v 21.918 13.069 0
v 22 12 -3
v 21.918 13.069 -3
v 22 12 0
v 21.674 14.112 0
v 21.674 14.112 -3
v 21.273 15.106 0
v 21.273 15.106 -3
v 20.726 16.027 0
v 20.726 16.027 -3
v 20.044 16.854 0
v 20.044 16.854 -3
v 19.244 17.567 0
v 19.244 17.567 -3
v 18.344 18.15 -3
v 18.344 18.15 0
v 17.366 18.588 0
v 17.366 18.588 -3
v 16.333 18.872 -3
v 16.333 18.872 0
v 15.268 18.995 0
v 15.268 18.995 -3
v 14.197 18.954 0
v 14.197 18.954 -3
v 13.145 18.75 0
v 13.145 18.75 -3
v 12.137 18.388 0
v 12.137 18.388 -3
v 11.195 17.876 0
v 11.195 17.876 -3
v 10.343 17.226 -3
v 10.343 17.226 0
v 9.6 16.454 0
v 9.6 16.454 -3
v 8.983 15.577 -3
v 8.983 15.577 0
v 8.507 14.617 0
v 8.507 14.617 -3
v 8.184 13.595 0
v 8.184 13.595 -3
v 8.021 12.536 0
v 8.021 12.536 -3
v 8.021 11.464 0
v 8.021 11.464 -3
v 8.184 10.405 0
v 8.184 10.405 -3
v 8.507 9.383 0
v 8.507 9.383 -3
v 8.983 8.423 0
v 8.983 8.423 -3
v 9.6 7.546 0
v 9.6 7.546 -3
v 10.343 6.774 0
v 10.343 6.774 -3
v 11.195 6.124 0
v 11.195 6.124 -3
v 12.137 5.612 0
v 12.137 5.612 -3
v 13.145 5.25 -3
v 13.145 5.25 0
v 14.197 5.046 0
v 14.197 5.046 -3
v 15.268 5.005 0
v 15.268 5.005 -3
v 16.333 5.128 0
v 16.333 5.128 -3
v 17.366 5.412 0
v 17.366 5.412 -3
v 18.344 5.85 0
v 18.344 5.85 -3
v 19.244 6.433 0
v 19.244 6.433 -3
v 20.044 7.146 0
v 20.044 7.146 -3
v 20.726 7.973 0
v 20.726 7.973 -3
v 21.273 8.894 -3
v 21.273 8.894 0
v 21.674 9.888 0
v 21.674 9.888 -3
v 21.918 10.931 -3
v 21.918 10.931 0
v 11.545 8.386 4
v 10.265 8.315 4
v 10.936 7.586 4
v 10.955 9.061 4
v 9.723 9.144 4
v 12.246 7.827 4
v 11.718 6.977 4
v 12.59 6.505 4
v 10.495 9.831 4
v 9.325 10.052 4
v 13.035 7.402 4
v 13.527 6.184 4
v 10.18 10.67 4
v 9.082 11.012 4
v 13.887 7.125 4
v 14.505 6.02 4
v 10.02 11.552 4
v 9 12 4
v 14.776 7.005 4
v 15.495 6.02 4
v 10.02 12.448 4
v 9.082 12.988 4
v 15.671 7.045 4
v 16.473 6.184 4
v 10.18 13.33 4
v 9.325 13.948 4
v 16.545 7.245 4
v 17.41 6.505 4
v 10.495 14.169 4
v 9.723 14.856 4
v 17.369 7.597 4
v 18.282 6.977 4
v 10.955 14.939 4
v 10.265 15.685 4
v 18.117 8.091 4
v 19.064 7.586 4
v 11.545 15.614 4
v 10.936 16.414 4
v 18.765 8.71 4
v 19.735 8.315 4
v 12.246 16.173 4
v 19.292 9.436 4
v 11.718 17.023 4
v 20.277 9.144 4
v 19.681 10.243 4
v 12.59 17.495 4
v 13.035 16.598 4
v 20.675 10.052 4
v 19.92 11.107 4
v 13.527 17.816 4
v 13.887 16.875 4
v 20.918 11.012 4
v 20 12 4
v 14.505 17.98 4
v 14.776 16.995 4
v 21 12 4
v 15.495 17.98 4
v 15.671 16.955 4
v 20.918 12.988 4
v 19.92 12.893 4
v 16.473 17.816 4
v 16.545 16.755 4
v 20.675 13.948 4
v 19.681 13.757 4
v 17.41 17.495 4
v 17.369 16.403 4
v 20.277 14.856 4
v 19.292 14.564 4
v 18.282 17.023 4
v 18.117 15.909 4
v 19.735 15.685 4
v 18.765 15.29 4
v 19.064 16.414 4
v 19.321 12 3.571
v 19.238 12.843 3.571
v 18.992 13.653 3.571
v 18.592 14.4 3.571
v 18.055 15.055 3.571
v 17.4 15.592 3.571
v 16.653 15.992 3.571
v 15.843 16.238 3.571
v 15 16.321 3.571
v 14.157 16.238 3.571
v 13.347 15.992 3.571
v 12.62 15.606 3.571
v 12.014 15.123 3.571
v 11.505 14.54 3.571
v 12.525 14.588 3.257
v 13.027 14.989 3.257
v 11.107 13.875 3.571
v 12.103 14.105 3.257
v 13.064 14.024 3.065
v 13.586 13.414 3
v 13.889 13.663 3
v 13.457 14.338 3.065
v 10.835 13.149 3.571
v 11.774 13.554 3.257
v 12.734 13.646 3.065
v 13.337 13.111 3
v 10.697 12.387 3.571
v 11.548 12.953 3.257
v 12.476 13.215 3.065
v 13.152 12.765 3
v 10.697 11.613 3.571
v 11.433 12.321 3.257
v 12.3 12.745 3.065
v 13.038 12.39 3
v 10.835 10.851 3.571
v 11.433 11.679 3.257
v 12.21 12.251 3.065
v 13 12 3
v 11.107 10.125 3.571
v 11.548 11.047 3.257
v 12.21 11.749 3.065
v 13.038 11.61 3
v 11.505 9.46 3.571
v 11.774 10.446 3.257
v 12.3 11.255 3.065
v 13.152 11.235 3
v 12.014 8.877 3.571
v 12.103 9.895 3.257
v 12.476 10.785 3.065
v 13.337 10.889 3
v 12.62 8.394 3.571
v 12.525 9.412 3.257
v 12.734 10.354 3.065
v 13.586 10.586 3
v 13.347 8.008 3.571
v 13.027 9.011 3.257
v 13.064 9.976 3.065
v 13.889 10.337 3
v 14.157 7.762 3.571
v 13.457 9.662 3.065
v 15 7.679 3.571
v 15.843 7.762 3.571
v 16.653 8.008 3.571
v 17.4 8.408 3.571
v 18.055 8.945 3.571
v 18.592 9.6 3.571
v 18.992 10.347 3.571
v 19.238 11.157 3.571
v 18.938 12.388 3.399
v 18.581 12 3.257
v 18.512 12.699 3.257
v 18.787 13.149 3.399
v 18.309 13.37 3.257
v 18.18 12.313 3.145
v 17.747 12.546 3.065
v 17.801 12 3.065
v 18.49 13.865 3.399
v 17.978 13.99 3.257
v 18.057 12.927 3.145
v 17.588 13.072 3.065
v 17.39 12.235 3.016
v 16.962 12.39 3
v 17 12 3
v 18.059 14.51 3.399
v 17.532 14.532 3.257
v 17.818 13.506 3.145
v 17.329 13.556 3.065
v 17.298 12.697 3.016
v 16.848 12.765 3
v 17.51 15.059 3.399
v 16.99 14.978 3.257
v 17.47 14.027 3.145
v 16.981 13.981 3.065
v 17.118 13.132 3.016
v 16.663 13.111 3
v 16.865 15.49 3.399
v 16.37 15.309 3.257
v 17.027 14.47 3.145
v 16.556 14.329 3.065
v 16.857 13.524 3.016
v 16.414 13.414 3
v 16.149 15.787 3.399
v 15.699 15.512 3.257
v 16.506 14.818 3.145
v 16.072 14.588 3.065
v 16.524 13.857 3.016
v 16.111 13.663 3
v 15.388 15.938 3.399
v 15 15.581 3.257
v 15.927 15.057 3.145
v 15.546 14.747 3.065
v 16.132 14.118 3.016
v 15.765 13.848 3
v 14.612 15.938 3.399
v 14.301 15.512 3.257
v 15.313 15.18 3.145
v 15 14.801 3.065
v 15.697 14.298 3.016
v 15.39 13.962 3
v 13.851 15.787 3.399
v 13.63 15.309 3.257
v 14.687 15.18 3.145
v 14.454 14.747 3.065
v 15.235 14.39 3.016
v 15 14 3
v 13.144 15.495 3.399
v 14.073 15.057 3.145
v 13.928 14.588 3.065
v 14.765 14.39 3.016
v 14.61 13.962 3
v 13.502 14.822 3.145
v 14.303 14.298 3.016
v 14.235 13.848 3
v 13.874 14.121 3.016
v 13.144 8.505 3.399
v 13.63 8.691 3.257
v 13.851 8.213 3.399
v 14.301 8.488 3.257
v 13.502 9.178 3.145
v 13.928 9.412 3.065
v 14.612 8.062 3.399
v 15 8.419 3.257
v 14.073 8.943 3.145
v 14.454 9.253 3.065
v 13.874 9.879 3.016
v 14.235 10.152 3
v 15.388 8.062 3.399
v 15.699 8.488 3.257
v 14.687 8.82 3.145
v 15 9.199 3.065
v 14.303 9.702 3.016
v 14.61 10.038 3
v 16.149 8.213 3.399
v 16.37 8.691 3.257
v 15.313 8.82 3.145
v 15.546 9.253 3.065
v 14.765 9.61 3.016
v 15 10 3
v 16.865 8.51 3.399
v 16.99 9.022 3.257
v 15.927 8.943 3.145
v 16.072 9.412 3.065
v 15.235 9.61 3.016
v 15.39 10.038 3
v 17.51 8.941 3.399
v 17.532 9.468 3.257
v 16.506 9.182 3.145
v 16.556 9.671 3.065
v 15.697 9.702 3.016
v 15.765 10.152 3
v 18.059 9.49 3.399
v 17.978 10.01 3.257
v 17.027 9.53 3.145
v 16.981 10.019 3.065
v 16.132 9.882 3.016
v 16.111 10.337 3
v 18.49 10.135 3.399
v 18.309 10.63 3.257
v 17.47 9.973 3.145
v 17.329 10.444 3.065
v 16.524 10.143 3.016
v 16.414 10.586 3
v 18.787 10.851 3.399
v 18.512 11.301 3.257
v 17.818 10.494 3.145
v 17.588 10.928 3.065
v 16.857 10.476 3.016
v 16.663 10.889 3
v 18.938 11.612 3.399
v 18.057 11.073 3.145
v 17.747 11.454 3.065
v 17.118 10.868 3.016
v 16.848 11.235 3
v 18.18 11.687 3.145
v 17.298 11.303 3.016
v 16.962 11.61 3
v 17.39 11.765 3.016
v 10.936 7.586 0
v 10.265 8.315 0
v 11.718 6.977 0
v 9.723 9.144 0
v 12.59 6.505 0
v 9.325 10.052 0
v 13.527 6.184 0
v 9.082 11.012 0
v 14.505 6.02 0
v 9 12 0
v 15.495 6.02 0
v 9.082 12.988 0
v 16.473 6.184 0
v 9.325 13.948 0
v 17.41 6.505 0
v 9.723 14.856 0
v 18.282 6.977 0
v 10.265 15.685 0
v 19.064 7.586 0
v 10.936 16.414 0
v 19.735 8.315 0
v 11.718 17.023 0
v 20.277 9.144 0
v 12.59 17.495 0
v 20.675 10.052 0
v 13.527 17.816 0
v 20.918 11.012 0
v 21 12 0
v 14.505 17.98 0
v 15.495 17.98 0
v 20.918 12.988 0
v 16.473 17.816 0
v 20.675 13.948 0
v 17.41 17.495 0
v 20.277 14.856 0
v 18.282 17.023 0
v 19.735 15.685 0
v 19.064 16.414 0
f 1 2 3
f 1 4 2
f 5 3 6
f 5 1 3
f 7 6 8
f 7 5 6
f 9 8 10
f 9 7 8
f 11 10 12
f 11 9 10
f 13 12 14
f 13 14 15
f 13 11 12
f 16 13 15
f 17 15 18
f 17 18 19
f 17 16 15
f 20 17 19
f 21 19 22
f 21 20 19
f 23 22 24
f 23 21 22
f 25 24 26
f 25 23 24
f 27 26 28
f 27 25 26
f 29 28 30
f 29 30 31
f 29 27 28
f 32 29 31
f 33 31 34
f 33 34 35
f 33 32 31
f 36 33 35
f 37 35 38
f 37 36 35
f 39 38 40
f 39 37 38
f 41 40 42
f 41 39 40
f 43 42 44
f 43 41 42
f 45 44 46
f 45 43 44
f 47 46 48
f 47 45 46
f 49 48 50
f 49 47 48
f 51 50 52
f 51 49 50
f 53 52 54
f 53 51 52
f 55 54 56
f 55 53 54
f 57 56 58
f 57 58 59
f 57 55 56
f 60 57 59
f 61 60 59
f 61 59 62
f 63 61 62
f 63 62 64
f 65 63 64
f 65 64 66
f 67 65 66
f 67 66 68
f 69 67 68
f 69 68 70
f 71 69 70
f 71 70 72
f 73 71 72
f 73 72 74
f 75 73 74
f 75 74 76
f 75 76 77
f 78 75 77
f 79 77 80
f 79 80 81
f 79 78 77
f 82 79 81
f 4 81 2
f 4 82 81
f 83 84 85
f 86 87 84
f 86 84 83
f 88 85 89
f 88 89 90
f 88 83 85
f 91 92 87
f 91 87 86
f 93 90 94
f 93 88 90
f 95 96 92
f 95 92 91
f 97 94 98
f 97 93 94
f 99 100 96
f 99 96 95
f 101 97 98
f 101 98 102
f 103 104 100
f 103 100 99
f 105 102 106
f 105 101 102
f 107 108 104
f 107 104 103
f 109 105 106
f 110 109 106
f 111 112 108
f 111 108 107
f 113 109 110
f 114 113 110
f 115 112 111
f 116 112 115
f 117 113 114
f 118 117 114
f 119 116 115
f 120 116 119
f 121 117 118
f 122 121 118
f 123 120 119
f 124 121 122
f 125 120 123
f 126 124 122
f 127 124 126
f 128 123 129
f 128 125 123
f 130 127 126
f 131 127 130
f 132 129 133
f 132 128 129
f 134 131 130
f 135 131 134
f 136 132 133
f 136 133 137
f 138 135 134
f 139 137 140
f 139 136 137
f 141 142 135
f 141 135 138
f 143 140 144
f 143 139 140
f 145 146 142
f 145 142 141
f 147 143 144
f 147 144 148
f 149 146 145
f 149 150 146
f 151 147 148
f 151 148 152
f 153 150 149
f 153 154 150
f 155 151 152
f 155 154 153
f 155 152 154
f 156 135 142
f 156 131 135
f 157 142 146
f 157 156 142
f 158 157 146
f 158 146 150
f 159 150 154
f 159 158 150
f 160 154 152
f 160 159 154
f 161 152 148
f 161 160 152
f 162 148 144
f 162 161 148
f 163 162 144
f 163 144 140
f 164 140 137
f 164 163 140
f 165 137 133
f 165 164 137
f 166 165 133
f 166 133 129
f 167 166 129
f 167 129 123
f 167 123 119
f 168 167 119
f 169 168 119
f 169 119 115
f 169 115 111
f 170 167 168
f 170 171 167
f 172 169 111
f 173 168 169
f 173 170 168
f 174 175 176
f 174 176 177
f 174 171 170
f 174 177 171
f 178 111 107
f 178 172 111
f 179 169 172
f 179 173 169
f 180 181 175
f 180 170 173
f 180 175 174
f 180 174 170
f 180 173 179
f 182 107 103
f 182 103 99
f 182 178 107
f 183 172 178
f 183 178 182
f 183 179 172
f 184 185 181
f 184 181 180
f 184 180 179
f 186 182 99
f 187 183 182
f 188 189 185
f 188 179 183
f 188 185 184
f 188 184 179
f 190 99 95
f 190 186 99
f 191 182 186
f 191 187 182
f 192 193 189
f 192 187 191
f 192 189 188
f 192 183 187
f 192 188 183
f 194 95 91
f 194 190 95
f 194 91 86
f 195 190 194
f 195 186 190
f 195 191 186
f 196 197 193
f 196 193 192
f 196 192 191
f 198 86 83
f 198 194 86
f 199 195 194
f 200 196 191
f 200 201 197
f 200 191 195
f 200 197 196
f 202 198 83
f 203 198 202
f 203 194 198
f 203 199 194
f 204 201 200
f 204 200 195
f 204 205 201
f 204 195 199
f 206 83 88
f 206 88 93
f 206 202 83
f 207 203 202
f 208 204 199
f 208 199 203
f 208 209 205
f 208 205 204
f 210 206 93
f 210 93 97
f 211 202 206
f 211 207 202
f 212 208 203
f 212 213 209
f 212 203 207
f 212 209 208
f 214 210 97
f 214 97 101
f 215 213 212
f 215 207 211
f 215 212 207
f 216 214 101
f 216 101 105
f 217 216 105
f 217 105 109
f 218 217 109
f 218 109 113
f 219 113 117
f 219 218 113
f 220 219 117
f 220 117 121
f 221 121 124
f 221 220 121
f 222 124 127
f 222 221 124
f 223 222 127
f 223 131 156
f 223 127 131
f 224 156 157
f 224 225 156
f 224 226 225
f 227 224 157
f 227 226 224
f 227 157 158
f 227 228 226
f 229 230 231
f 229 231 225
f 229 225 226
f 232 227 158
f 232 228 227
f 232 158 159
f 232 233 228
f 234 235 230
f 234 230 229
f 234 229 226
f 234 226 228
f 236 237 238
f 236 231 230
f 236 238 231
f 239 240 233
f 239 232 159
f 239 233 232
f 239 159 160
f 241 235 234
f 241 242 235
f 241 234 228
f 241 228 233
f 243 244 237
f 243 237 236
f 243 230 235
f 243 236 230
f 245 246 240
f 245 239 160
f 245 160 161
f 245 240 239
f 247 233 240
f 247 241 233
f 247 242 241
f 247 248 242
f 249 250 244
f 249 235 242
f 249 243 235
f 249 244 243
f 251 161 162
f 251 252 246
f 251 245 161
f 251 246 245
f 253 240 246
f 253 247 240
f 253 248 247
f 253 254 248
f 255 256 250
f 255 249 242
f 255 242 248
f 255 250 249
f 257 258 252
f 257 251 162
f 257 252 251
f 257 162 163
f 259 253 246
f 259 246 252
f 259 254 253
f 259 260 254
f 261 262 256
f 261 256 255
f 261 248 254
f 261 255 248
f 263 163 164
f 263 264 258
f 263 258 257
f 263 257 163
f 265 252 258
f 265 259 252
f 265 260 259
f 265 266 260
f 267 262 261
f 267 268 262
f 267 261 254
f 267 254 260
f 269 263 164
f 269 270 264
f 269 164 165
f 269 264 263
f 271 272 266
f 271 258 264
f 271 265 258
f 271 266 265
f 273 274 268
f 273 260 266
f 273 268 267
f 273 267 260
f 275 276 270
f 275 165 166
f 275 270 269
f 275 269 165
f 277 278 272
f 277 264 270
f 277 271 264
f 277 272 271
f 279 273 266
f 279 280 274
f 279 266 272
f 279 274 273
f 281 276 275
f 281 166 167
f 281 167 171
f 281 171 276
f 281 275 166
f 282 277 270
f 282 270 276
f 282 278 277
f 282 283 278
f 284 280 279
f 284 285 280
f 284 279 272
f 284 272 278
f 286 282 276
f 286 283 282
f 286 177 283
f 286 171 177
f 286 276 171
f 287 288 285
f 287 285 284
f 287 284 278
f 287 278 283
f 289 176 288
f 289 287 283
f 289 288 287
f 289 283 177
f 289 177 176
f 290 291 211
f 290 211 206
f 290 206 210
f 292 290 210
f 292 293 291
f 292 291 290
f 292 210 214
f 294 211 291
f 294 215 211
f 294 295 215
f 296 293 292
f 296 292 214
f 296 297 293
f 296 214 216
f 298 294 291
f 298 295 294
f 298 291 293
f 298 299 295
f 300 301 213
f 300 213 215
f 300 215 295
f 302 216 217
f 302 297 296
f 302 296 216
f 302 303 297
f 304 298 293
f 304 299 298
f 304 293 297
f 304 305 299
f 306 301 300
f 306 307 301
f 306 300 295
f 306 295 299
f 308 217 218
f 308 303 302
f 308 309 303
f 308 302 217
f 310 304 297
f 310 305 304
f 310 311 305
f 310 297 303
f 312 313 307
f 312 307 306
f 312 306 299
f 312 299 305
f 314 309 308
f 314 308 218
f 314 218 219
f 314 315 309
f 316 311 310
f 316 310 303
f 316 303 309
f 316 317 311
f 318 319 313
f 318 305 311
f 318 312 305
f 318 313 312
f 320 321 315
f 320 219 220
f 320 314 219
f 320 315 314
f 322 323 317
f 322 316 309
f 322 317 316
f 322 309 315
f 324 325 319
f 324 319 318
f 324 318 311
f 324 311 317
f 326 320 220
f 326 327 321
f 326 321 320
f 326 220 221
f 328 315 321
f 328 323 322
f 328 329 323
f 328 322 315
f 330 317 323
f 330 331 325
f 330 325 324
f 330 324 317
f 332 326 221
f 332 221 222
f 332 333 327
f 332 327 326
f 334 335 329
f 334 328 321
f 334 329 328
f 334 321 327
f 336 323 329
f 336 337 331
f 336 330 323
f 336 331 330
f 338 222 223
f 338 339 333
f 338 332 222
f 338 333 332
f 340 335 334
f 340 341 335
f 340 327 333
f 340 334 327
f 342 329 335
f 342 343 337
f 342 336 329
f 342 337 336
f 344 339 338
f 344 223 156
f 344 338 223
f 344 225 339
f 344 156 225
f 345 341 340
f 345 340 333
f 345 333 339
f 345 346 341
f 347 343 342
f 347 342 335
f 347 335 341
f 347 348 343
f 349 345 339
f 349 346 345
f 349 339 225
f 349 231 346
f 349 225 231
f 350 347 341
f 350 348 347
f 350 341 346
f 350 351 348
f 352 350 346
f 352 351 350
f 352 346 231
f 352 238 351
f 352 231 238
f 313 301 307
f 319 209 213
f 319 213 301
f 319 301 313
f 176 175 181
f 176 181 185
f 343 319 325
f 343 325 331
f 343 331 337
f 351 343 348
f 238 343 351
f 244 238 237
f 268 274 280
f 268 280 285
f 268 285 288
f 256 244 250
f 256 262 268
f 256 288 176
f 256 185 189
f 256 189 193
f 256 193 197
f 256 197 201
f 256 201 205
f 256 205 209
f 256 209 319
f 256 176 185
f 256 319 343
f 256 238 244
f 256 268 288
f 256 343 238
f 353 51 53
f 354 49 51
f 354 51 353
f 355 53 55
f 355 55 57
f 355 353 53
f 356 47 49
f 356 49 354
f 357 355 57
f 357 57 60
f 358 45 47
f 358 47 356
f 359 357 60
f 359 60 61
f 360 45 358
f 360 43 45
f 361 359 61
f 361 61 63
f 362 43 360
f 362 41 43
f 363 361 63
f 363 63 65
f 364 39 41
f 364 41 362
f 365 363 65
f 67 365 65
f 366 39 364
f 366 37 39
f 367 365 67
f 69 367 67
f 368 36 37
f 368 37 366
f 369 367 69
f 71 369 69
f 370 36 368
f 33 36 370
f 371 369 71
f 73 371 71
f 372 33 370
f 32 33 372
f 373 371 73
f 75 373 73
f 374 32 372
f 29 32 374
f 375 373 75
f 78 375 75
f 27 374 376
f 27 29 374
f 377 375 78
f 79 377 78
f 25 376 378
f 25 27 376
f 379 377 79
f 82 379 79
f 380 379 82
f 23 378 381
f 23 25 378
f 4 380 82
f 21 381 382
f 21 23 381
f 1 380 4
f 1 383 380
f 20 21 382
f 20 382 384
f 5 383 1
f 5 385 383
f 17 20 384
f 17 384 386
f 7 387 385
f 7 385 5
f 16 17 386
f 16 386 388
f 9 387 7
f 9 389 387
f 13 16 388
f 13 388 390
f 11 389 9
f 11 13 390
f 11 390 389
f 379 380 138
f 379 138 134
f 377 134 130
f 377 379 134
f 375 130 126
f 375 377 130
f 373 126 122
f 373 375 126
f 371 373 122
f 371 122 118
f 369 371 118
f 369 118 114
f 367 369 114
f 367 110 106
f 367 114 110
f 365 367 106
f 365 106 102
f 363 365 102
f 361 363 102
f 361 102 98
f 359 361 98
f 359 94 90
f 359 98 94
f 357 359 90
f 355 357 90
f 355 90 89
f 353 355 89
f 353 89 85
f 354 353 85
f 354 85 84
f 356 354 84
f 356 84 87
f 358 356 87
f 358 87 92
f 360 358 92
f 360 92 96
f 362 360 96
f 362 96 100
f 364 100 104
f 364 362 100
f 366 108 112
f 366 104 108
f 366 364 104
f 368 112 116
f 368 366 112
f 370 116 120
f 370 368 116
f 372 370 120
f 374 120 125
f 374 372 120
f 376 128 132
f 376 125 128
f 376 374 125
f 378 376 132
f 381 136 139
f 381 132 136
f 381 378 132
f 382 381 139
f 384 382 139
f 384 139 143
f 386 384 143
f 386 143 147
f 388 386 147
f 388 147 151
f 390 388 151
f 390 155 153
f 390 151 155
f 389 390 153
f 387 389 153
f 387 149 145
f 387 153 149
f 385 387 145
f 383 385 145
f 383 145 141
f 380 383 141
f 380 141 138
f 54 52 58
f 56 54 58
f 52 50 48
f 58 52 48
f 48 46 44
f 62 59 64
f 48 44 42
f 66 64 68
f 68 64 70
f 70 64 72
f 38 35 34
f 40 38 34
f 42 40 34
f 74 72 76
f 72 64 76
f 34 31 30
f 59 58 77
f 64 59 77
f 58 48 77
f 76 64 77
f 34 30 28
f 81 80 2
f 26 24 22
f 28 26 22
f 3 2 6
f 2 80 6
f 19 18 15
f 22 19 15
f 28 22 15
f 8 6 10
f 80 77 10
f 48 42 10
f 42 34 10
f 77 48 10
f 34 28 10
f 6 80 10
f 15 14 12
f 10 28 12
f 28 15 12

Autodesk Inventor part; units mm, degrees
ref_plane "YZ Plane" through (0, 0, 0) normal (1, 0, 0) x (0, 1, 0)
ref_plane "XZ Plane" through (0, 0, 0) normal (0, 1, 0) x (-1, 0, 0)
ref_plane "XY Plane" through (0, 0, 0) normal (0, 0, 1) x (1, 0, 0)
sketch "Sketch1" plane through (0, 0, 0) normal (0, 0, 1) x (1, 0, 0)
  circle A0 centre (15, 12) radius 6
  circle A1 centre (15, 12) radius 7
  point P0 (0, 0)
  dimension "d0" = 12
  dimension "d1" = 14
extrude "Extrusion1" add sketch "Sketch1" along normal blind 4 contours A0
extrude "Extrusion2" add sketch "Sketch1" against normal blind 3 contours A0 | A1
sketch "Sketch2" plane through (15, 12, 4) normal (0, 0, 1) x (1, 0, 0)
  circle A0 centre (0, 0) radius 5
  point P0 (-15, -12)
  dimension "d6" = 10
extrude "Extrusion3" cut sketch "Sketch2" against normal blind 1
fillet "Fillet1" radius 5 1 edges at (10, 12, 3)
properties part number "but"
